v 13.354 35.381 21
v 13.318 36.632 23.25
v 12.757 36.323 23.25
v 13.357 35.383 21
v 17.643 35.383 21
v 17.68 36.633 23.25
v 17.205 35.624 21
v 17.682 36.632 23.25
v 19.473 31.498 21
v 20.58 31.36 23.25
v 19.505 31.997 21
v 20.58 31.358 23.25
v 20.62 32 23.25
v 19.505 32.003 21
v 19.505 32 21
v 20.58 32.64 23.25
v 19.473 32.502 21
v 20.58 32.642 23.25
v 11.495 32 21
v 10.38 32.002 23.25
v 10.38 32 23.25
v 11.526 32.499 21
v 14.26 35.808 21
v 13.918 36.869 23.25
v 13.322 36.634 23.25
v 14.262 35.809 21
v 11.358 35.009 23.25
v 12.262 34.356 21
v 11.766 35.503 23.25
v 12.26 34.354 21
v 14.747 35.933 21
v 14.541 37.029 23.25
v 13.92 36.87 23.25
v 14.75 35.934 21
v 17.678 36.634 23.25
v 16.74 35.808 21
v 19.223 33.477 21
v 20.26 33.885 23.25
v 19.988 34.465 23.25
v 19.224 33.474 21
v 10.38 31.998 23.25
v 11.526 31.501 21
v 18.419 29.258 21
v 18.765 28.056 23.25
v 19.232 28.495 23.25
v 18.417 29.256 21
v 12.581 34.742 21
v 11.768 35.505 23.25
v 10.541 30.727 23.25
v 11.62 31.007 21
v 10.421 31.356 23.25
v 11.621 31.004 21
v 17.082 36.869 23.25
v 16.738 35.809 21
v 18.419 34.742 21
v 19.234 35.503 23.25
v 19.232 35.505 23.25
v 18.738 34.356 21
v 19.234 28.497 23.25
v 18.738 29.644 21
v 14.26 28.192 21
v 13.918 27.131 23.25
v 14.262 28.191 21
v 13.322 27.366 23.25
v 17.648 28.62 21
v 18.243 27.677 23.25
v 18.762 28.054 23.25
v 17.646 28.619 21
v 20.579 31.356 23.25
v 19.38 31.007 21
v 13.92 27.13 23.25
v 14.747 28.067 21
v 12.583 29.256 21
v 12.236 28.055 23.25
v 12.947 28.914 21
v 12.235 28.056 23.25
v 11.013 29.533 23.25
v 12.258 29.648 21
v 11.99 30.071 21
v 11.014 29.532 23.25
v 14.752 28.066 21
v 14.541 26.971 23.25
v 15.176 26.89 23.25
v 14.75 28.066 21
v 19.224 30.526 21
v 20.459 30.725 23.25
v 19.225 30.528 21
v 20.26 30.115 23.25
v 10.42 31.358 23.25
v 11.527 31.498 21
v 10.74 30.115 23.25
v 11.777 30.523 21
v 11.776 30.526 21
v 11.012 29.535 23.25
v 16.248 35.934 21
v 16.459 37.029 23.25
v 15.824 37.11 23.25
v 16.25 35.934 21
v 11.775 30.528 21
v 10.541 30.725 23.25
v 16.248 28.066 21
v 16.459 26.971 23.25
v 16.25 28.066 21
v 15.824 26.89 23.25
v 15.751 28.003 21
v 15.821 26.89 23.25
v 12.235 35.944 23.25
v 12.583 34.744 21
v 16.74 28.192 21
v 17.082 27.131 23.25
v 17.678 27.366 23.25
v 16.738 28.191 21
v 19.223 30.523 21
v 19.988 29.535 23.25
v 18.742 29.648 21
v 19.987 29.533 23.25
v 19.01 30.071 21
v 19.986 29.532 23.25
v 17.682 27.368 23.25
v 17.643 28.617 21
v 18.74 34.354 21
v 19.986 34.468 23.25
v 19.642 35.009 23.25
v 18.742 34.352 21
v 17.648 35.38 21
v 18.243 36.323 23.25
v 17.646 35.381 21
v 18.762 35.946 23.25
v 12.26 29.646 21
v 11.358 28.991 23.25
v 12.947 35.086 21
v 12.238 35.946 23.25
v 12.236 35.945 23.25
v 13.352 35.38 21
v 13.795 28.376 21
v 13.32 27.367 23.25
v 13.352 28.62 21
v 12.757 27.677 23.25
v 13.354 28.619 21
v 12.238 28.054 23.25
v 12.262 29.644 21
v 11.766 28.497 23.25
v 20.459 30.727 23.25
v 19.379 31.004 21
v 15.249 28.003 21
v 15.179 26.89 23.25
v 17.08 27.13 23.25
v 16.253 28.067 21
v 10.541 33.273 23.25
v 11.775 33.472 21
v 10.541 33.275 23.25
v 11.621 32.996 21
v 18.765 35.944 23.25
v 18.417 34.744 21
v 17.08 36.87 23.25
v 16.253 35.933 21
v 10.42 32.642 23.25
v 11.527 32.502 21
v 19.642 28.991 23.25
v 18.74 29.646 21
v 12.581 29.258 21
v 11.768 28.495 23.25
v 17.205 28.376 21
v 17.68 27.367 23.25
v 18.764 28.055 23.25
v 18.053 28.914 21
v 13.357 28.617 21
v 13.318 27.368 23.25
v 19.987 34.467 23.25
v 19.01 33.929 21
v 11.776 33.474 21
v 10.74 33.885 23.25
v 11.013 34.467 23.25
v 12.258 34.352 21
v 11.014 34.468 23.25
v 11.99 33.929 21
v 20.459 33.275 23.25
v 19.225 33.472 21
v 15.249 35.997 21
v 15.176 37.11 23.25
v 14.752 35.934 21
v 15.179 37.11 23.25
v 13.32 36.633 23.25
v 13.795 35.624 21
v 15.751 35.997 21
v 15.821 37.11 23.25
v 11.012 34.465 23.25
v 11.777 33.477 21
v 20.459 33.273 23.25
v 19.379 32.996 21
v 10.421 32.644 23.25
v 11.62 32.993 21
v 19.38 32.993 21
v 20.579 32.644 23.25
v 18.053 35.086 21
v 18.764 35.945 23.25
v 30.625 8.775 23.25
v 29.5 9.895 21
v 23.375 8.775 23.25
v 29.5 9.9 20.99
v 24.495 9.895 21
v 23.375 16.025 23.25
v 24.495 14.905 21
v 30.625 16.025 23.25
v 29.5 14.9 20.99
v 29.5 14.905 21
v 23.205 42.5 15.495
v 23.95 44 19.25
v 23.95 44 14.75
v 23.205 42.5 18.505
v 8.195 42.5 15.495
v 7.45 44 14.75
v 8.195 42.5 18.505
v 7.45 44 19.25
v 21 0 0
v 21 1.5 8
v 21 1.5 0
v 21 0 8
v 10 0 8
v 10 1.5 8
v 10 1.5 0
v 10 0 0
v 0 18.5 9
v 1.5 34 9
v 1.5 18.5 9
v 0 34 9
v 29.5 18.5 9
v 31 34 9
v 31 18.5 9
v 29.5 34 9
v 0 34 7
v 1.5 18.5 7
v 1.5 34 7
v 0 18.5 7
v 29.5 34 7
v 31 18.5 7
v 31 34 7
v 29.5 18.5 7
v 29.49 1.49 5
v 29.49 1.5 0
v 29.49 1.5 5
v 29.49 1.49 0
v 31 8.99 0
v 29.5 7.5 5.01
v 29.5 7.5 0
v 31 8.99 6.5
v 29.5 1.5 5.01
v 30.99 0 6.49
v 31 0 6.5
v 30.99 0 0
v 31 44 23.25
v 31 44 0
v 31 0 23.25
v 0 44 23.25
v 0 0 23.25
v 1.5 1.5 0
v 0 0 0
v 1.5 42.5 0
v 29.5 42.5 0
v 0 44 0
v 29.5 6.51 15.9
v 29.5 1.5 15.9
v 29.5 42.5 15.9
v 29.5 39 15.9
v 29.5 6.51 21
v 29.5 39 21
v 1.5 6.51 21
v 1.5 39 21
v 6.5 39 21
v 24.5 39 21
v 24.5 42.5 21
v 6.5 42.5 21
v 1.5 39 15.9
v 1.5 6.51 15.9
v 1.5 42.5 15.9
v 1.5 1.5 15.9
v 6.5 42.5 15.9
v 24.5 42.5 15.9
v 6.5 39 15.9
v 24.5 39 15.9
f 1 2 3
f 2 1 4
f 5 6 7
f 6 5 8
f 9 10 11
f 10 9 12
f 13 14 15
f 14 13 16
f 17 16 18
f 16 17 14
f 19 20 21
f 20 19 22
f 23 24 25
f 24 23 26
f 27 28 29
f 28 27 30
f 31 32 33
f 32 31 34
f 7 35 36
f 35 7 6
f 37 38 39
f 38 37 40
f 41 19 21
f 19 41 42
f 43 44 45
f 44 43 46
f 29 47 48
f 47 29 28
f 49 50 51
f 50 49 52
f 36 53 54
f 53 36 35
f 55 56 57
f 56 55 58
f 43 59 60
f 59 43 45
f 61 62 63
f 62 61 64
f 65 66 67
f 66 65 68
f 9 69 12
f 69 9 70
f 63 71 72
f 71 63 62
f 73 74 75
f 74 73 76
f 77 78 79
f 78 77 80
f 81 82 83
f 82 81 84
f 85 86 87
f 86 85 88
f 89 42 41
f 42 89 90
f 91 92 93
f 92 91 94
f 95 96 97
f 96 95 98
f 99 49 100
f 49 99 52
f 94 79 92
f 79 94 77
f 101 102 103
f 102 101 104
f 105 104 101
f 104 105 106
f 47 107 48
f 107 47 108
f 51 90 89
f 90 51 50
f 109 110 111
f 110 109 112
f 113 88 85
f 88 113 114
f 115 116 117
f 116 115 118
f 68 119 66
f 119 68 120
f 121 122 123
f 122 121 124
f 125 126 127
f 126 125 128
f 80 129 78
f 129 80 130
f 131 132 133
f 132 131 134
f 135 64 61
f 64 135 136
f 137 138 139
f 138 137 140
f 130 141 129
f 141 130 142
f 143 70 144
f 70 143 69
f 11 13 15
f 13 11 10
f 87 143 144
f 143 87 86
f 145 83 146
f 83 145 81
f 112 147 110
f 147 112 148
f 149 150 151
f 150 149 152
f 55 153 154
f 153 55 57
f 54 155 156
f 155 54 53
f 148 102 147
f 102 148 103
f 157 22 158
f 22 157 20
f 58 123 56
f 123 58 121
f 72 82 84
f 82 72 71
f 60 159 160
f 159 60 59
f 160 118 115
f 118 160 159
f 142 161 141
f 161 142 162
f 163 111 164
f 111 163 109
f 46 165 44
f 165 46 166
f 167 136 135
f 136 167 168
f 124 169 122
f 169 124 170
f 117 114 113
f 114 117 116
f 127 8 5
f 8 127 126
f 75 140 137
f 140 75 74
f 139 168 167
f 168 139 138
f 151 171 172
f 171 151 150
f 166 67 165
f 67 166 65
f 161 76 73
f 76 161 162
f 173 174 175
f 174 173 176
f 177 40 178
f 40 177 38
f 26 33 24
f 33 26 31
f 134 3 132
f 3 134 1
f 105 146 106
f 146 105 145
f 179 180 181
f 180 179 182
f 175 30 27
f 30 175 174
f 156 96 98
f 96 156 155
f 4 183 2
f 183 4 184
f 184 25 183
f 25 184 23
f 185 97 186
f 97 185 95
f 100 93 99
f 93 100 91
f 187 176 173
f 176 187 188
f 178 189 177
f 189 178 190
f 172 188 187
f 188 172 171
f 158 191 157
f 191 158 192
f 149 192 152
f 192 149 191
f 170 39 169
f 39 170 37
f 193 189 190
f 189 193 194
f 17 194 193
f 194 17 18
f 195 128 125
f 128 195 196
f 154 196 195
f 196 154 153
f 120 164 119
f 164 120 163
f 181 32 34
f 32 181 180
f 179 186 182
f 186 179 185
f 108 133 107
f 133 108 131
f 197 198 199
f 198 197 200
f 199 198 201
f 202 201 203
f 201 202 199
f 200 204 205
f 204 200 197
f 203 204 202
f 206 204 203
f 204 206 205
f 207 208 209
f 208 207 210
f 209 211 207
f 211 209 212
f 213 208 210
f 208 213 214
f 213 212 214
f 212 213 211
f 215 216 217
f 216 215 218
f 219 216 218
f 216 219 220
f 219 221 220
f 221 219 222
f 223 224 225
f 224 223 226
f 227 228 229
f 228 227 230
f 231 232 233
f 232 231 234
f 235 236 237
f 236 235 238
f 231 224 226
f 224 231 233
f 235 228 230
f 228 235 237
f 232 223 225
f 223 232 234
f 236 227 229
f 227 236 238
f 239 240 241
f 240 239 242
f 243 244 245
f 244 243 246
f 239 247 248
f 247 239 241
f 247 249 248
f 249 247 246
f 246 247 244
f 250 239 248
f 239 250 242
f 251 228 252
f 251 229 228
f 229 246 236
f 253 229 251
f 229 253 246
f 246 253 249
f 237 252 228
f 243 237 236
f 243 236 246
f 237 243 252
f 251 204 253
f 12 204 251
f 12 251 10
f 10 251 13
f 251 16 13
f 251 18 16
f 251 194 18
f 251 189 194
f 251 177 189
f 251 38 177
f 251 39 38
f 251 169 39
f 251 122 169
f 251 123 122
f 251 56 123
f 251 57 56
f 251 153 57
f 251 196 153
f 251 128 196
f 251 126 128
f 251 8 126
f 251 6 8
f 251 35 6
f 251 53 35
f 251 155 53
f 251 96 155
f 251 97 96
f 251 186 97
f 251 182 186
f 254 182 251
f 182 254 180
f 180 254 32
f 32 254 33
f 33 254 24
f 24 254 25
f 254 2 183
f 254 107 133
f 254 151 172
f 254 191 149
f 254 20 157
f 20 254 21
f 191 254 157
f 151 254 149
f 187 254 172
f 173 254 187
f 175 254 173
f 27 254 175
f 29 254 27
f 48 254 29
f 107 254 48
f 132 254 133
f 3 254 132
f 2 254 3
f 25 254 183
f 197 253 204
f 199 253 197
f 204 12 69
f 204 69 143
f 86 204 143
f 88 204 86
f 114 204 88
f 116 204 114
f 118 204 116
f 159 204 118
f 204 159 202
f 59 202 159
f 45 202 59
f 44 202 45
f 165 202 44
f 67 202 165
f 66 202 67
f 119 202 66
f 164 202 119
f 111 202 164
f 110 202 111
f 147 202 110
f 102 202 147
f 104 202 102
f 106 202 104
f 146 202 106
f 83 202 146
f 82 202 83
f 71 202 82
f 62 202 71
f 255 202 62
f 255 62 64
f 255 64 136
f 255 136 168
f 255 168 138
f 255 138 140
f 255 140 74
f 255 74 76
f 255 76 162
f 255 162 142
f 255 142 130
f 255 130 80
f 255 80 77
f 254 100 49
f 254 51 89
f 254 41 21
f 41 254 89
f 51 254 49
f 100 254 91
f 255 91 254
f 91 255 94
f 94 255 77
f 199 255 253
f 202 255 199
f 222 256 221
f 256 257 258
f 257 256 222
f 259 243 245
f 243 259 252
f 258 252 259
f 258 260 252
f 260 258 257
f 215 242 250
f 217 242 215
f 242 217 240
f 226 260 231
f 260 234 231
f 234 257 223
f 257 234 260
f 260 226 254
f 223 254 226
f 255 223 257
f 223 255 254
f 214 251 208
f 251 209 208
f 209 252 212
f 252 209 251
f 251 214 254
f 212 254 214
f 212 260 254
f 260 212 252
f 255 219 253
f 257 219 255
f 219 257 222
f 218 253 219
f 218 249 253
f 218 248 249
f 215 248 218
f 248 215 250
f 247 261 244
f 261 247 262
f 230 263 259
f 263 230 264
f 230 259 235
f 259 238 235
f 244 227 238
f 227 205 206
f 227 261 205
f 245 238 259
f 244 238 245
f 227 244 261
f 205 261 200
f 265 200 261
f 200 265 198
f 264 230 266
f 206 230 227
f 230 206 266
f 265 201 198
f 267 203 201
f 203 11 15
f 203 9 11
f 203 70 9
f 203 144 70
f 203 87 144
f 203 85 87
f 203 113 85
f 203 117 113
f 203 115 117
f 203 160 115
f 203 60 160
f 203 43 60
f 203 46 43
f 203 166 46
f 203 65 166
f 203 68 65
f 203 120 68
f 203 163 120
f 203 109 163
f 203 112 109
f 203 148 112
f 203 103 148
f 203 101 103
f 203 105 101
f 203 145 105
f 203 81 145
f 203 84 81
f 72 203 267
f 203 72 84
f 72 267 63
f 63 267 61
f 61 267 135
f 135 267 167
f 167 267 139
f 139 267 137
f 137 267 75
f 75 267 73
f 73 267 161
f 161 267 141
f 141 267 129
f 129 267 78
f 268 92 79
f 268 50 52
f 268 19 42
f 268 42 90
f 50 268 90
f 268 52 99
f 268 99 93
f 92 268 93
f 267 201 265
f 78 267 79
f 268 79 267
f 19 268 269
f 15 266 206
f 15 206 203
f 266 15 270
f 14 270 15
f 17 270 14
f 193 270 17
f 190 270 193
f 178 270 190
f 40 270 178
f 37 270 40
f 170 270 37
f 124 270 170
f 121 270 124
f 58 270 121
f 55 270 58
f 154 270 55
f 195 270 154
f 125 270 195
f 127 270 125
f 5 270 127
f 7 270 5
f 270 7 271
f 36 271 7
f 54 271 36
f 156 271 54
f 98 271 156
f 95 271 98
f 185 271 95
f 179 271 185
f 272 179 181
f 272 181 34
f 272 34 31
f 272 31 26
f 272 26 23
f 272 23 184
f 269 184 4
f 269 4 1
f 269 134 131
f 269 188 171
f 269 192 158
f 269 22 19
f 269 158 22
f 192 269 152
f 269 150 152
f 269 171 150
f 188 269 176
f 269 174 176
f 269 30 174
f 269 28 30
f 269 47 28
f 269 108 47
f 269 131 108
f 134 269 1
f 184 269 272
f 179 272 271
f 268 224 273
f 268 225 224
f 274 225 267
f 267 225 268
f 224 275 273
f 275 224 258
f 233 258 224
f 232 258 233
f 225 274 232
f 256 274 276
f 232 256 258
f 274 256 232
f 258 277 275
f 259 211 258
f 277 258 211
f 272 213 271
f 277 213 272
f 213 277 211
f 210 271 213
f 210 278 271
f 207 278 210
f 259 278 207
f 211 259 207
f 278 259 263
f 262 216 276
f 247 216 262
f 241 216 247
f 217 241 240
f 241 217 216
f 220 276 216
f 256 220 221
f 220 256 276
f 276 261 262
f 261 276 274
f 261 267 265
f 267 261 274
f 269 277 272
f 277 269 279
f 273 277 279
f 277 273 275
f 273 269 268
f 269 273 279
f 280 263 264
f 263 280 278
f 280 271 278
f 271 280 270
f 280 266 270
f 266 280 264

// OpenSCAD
/*
 Enclosure Box for esp32-cam + esp32-cam-mb combination
 Purchased 2/2023 from: https://www.amazon.com/dp/B09265G5Z4
 Price: including tax and Colorado's illegal "delivery fee", about $8 each
 */ 

boxFrontPanelThickness=2.25;
boxSideWallThickness=1.5;

boxInnerHeight=41;
boxInnerWidth=28;
boxInnerDepth=21;

sdSlotDepth=3;
sdSlotWidth=15;
sdSlotFlareAmount=boxSideWallThickness/2;
sdSlotFlareDepth=sdSlotDepth+sdSlotFlareAmount*2;
sdSlotFlareWidth=sdSlotWidth+sdSlotFlareAmount*2;
sdSlotCenterOffset=0.2;
sdSlotInsetFromFace=2.5;

cameraHoleHeightCenterPosition=30.5;  // relative to boxInnerHeight bottom
cameraHoleWidthCenterPosition=boxInnerWidth/2;  // centered
cameraHoleDia=8;
cameraHoleFlareAmount=boxFrontPanelThickness/2;  // ~60 degree bevel
cameraHoleFlareDia=cameraHoleDia+cameraHoleFlareAmount*2;

ledHoleHeight=5;
ledHoleWidth=5;
ledHoleFlareAmount=boxFrontPanelThickness/2;
ledHoleFlareHeight=ledHoleHeight+ledHoleFlareAmount*2;
ledHoleFlareWidth=ledHoleWidth+ledHoleFlareAmount*2;
ledHoleBottomPosition=8.4;  // relative to boxInnerHeight bottom
ledHoleSideInsetPosition=0; // relative to boxInnerWidth on closest side.

usbAccessHoleDepth=8;  // relative to boxInnerDepth from rear
usbAccessHoleWidth=11;  // centered relative to boxInnerWidth

mountClipSlotHeight=15.5;  // positioned relative to boxInnerHeight
mountClipSlotDepth=2; // positioned relative to boxInnerDepth
mountClipSlotHeightPosition=17;  // bottom of the slot
mountClipSlotInsetFromBack=7; // rearmost edge

// this is on the same side as the LED (right when facing front of box)
resetButtonAccessHoleDepth=5;
resetButtonAccessHoleHeight=6;
resetButtonAccessHoleFlareDepth=resetButtonAccessHoleDepth+boxSideWallThickness*2;
resetButtonAccessHoleFlareHeight=resetButtonAccessHoleHeight+boxSideWallThickness*2;

topCornerSupportWidth=5;
topCornerSupportHeight=3.5;
topCornerSupportDepth=5.1;

bottomSupportHeight=5;
bottomSupportDepth=topCornerSupportDepth;


overlap=0.01;

$fn=50;

// calculated
boxOuterWidth=boxInnerWidth+boxSideWallThickness*2;
boxOuterHeight=boxInnerHeight+boxSideWallThickness*2;
boxOuterDepth=boxInnerDepth+boxFrontPanelThickness;

union() {
    boxWithCutouts();
    // bottom support
    translate([boxSideWallThickness-overlap,boxSideWallThickness,boxInnerDepth-bottomSupportDepth])
        cube([boxInnerWidth+overlap*2,bottomSupportHeight+overlap,bottomSupportDepth+overlap]);
    // top left support
    translate([boxSideWallThickness-overlap,boxSideWallThickness+boxInnerHeight-topCornerSupportHeight,boxInnerDepth-topCornerSupportDepth])
        cube([topCornerSupportWidth+overlap,topCornerSupportHeight+overlap,topCornerSupportDepth+overlap]);
    // top right support
    translate([boxSideWallThickness+boxInnerWidth-topCornerSupportWidth,boxSideWallThickness+boxInnerHeight-topCornerSupportHeight,boxInnerDepth-topCornerSupportDepth])
        cube([topCornerSupportWidth+overlap,topCornerSupportHeight+overlap,topCornerSupportDepth+overlap]);
}

module boxWithCutouts() {
    difference() {
        cube([boxOuterWidth,boxOuterHeight,boxOuterDepth]);
        translate([boxSideWallThickness,boxSideWallThickness,-overlap])
            cube([boxInnerWidth,boxInnerHeight,boxInnerDepth+overlap]);
        translate([boxSideWallThickness,boxSideWallThickness,0]) {
            // camera hole
            translate([cameraHoleWidthCenterPosition,cameraHoleHeightCenterPosition,boxInnerDepth-overlap])
                cylinder(d1=cameraHoleDia, d2=cameraHoleFlareDia, h=boxFrontPanelThickness+overlap*2);
            // led hole
            translate([boxInnerWidth-ledHoleWidth-ledHoleSideInsetPosition,
                    ledHoleBottomPosition,boxInnerDepth-overlap])
                hull() {
                    cube([ledHoleWidth,ledHoleHeight,overlap]);
                    translate([-ledHoleFlareAmount,-ledHoleFlareAmount,boxFrontPanelThickness+overlap])
                        cube([ledHoleFlareWidth,ledHoleFlareHeight,overlap]);
                }
            // sd card slot
            translate([boxInnerWidth/2-sdSlotWidth/2+sdSlotCenterOffset,
                    boxInnerHeight-overlap,boxInnerDepth-sdSlotDepth-sdSlotInsetFromFace])
                hull() {
                    cube([sdSlotWidth,overlap,sdSlotDepth]);
                    translate([-sdSlotFlareAmount,boxSideWallThickness+overlap,-sdSlotFlareAmount])
                        cube([sdSlotFlareWidth,overlap,sdSlotFlareDepth]);
                }
            // usb access hole
            translate([boxInnerWidth/2-usbAccessHoleWidth/2,-boxSideWallThickness-overlap,-overlap])
                cube([usbAccessHoleWidth,boxSideWallThickness+overlap*2,usbAccessHoleDepth+overlap]);
            // mount clip holes (one cube cutting all the way across)
            translate([-boxSideWallThickness-overlap,mountClipSlotHeightPosition,mountClipSlotInsetFromBack])
                cube([boxOuterWidth+overlap*2,mountClipSlotHeight,mountClipSlotDepth]);
            // reset button access hole (on the right side)
            translate([boxInnerWidth-overlap,-overlap,0])
                hull() {
                    cube([overlap,resetButtonAccessHoleHeight,resetButtonAccessHoleDepth]);
                    translate([boxSideWallThickness+overlap,-boxSideWallThickness,-boxSideWallThickness])
                        cube([overlap,resetButtonAccessHoleFlareHeight,resetButtonAccessHoleFlareDepth]);
                }

        }
    }

}
